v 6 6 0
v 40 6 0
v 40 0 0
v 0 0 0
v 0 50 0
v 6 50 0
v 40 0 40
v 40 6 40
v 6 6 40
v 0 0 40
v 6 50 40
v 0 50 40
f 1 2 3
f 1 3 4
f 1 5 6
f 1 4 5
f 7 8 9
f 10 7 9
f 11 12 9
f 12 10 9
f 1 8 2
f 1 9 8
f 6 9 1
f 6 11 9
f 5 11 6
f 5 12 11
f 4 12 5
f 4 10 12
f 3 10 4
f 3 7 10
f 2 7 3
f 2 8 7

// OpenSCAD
$fn = 32;

// ----------------------------------------------------------------------
// Structural section: angle 40 x 50 mm
// ----------------------------------------------------------------------

// --- parameters (mm) ---
sec_w = 40;               // leg width, X
sec_h = 50;               // leg height, Y
flange_t = 6;             // leg thickness
plate_t = 40;             // cut length, Z (extrusion height)

profile = [[0, 0], [40, 0], [40, 6], [6, 6], [6, 50], [0, 50]];  // primary outline, 6 points, counter clockwise

// --- the one profile operation ---
linear_extrude(height = plate_t) polygon(points = profile);
